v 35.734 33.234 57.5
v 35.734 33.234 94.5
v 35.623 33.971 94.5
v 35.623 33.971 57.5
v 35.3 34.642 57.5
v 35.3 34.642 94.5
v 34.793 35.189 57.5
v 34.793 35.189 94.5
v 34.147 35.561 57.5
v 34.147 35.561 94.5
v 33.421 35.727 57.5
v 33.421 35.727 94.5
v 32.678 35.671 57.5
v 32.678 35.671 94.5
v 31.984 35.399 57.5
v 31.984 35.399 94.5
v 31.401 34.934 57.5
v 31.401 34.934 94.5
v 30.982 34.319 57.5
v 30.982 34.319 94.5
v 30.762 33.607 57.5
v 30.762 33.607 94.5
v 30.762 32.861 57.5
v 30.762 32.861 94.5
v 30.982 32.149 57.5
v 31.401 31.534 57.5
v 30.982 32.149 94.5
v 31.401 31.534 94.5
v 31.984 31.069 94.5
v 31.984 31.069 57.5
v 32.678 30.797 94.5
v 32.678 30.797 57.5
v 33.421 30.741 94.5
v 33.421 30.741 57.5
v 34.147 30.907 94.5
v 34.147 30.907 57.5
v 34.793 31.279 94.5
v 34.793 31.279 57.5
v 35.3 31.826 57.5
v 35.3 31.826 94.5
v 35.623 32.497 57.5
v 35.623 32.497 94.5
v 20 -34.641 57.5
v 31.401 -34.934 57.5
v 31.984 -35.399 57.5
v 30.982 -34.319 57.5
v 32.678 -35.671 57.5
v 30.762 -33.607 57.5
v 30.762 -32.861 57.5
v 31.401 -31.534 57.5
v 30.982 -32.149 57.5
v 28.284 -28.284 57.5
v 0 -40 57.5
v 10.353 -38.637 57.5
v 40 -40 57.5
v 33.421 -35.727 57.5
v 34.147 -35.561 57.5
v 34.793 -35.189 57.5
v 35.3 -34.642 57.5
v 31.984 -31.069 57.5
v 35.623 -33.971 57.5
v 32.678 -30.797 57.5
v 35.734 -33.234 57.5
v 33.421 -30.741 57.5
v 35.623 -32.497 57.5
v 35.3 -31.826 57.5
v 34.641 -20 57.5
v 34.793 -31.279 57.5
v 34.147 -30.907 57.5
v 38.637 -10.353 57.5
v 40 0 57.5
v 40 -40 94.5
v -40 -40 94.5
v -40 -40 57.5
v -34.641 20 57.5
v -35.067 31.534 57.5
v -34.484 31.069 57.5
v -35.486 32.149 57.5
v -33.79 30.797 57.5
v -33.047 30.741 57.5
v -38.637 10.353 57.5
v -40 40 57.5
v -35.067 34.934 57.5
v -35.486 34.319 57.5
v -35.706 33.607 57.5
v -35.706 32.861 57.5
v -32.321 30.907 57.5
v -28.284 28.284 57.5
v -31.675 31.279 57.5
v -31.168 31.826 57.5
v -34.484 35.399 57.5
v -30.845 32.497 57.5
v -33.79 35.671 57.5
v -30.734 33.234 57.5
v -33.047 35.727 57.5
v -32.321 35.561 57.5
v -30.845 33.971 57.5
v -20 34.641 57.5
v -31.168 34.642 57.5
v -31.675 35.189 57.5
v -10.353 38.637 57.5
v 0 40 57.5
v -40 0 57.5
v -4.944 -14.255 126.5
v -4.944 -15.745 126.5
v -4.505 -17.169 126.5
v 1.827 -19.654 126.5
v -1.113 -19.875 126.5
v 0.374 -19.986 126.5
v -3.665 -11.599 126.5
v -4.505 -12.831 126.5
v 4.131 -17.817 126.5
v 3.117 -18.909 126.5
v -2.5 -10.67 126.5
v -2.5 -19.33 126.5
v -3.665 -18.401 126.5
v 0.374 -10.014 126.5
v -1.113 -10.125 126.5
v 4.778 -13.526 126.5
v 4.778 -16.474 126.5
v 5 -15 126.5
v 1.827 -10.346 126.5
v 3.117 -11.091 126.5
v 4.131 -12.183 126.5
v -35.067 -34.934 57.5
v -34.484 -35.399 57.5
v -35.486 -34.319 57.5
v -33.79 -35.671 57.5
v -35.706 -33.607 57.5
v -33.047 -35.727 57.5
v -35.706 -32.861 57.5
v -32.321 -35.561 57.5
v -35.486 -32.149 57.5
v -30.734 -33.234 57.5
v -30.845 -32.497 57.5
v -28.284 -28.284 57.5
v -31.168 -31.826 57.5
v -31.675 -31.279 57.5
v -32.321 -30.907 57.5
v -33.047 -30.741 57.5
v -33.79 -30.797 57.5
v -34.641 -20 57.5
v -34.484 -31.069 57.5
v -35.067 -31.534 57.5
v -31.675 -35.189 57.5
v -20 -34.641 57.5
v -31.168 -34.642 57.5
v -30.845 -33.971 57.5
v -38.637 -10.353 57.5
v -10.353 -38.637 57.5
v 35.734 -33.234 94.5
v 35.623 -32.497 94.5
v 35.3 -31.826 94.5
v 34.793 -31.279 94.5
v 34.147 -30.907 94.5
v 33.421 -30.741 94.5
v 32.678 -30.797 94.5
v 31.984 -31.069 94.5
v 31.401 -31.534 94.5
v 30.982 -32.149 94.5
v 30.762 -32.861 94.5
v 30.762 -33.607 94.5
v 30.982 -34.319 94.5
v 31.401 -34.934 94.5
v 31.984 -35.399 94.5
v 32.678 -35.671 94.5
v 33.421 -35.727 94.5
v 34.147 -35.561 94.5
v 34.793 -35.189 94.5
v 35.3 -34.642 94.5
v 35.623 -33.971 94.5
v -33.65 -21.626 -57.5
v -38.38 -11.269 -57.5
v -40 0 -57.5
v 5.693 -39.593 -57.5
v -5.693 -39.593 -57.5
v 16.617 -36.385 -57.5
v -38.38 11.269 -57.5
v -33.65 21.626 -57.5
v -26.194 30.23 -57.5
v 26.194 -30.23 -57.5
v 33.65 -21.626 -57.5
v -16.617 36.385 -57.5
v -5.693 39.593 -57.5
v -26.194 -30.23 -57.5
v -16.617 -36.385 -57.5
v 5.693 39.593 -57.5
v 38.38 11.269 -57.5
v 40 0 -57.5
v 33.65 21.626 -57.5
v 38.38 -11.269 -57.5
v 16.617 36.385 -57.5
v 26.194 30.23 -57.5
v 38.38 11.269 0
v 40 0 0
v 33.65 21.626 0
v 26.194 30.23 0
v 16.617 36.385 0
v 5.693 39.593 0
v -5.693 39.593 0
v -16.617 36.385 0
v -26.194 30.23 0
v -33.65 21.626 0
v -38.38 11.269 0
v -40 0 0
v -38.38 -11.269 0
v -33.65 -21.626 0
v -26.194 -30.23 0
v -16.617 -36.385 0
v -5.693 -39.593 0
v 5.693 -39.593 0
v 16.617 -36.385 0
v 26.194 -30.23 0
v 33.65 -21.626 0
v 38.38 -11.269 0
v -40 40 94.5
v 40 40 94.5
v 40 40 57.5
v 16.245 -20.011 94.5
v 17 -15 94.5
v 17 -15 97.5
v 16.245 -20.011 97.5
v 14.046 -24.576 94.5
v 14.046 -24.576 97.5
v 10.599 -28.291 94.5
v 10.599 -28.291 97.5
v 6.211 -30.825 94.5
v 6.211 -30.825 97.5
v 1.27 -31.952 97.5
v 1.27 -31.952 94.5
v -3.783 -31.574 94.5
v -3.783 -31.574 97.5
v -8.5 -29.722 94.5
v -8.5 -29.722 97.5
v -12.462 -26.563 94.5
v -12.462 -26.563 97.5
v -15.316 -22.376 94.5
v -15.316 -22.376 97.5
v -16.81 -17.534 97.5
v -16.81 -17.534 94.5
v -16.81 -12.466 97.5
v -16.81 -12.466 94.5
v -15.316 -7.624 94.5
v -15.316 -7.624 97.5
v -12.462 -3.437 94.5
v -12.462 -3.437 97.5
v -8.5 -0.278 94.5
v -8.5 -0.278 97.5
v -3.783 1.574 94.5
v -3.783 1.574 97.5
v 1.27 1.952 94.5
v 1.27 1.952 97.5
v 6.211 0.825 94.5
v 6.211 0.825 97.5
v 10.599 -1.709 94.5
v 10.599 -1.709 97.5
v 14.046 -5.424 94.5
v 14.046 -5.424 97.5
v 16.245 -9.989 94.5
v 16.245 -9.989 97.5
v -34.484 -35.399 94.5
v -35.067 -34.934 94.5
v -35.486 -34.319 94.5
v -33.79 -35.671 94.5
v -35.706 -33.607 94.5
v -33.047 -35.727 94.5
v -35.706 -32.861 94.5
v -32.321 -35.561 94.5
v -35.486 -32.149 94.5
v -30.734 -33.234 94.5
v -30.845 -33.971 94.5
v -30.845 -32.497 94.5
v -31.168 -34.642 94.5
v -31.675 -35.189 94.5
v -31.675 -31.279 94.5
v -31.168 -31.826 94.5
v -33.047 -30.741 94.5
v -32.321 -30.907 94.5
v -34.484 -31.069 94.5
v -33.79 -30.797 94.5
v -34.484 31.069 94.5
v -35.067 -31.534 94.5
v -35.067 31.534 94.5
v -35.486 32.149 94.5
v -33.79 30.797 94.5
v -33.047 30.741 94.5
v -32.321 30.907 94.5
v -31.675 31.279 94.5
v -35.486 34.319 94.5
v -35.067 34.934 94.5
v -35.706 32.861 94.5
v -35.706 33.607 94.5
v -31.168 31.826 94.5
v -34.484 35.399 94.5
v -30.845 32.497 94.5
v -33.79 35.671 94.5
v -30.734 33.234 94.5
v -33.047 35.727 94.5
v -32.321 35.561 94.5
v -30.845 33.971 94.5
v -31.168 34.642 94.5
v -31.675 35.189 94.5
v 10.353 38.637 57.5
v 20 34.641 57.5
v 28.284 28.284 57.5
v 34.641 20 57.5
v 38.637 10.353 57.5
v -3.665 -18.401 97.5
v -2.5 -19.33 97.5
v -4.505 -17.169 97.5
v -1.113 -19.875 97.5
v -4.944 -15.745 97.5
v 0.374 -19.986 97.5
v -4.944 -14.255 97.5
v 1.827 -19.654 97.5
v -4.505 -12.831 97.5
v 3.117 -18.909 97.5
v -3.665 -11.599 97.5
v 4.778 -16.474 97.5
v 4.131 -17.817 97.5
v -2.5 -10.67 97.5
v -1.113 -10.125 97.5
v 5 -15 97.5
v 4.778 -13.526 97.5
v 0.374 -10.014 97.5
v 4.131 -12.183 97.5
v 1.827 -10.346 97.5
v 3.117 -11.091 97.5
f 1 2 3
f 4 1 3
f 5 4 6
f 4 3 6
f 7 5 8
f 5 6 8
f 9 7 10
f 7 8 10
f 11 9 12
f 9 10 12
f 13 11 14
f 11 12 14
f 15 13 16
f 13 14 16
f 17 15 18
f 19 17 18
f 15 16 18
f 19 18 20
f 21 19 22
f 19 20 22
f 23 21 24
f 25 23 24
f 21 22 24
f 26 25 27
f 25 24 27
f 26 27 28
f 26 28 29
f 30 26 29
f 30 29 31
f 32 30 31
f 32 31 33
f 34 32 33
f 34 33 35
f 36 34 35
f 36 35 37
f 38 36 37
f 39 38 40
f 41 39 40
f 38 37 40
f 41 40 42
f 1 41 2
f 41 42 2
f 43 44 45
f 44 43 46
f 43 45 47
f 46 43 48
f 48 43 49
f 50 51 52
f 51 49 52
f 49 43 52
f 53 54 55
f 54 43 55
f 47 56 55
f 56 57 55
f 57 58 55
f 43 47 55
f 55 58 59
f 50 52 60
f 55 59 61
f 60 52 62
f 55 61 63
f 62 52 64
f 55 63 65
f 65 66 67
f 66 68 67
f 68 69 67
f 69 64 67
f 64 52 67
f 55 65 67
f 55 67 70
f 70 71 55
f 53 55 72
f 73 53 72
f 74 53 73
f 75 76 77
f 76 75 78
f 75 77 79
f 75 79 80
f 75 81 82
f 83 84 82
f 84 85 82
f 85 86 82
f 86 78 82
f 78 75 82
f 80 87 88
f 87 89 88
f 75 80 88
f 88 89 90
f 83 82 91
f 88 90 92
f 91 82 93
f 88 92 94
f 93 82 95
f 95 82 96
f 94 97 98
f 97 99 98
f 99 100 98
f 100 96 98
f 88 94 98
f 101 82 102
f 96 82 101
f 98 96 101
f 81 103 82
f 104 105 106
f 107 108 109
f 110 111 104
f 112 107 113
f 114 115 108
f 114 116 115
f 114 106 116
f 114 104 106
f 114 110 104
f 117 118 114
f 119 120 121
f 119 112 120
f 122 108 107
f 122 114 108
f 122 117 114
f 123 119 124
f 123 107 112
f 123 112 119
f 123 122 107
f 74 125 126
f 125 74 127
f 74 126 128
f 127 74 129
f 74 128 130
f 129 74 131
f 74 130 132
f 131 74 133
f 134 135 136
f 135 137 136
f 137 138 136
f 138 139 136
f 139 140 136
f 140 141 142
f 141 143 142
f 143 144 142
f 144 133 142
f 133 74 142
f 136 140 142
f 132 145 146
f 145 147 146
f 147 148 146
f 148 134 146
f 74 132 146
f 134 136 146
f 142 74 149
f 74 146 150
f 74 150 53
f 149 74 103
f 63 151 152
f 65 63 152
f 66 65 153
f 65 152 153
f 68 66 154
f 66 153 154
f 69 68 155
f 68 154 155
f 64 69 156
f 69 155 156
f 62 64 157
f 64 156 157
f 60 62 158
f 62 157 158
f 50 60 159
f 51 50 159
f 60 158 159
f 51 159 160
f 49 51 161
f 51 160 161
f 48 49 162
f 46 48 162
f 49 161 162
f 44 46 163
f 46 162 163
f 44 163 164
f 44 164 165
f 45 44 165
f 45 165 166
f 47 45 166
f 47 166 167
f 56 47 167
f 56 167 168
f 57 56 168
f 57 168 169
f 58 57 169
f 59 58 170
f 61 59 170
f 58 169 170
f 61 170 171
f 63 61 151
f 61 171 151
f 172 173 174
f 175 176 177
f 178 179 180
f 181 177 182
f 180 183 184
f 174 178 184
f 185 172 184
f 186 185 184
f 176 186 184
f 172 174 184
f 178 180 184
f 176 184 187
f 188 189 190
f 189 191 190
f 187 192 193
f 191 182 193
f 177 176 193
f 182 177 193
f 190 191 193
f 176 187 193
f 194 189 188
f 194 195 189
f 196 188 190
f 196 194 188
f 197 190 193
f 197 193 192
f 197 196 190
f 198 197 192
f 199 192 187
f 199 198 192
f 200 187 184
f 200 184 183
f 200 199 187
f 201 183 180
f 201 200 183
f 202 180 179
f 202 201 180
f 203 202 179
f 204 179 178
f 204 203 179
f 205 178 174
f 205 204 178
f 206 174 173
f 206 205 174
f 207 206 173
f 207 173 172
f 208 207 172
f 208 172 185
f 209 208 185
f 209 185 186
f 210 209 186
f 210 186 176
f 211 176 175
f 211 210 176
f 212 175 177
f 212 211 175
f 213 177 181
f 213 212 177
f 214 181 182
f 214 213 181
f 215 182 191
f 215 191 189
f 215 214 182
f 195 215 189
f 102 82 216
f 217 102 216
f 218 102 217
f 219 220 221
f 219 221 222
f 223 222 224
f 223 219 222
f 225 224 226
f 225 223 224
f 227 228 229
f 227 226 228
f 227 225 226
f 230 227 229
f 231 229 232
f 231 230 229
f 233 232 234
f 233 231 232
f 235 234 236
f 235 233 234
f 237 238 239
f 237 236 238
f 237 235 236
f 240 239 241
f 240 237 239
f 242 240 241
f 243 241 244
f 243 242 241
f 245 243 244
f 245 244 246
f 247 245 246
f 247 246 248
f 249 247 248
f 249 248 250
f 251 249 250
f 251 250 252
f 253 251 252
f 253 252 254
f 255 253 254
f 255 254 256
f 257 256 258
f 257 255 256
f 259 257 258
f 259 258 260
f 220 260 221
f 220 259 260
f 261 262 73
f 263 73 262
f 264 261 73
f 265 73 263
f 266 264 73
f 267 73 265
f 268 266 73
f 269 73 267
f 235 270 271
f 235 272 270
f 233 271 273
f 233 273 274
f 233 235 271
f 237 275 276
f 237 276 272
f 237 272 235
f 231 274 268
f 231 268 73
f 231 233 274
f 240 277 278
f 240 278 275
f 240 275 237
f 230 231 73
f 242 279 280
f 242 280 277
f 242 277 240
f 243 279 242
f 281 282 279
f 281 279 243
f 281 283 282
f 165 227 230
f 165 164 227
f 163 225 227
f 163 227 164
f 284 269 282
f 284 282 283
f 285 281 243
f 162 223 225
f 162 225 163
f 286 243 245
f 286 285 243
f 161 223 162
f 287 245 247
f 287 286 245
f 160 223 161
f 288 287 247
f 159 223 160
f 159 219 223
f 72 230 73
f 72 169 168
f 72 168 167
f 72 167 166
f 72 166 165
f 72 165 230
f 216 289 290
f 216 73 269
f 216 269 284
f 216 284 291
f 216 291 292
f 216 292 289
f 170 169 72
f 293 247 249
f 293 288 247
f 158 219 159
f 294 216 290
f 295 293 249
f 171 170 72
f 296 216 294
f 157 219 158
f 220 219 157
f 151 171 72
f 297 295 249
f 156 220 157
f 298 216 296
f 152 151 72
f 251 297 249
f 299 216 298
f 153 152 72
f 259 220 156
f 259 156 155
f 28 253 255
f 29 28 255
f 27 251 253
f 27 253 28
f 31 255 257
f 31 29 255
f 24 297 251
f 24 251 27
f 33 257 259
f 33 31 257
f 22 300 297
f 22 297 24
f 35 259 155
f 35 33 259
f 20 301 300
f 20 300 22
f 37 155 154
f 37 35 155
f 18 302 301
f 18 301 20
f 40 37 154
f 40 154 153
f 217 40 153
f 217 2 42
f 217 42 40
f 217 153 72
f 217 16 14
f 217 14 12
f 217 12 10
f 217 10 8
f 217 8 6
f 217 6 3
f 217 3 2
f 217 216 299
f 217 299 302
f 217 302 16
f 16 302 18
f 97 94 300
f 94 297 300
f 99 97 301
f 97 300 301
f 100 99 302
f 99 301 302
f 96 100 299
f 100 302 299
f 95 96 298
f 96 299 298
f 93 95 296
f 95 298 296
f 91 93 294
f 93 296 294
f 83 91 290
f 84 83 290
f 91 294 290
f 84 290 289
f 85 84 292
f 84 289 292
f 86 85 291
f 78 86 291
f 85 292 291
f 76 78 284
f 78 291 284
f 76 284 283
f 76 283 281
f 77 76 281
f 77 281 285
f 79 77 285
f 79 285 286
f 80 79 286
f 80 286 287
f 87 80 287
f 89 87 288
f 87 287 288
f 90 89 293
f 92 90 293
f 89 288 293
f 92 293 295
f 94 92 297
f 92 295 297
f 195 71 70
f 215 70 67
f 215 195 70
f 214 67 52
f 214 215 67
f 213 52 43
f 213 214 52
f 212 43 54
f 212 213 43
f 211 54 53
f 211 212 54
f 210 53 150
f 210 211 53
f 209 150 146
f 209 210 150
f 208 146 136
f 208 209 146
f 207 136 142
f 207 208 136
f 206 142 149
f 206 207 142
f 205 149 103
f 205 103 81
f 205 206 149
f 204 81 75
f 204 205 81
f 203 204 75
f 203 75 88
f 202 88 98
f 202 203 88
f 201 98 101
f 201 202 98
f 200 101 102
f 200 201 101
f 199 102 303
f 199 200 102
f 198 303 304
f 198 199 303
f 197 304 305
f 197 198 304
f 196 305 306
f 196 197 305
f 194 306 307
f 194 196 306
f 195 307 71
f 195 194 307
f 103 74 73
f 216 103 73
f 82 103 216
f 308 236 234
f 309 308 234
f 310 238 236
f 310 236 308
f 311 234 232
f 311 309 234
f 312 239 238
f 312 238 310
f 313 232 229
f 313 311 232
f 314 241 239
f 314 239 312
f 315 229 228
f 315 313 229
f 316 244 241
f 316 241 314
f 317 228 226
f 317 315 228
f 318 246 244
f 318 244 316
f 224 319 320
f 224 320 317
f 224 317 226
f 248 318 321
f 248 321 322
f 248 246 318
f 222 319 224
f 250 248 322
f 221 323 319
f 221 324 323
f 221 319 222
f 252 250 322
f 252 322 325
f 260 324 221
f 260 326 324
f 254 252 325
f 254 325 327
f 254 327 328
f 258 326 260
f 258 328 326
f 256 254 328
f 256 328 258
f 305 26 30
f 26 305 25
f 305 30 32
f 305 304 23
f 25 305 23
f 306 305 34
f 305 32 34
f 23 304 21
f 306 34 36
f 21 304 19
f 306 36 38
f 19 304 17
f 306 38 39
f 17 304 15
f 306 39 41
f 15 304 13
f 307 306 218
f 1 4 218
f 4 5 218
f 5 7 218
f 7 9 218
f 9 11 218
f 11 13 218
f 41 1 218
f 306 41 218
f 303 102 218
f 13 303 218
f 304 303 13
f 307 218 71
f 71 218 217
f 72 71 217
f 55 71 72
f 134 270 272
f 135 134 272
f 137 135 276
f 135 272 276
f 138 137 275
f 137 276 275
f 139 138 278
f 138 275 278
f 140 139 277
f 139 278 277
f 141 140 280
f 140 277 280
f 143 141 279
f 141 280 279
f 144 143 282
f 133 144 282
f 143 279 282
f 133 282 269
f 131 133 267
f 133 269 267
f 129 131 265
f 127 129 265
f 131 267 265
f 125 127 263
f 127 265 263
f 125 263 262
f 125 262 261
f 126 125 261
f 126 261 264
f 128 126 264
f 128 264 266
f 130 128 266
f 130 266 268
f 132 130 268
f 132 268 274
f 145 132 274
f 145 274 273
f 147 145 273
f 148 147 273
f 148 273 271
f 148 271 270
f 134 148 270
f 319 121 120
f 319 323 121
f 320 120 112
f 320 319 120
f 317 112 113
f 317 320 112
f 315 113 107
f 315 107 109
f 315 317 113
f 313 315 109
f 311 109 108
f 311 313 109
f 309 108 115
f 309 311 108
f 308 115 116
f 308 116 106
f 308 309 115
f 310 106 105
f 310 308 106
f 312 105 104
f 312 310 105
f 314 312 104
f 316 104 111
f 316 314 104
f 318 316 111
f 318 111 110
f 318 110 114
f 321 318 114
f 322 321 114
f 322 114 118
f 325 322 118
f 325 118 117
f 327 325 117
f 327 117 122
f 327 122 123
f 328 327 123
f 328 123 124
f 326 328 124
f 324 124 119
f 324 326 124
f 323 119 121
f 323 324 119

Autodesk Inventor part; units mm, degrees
ref_plane "YZ Plane" through (0, 0, 0) normal (1, 0, 0) x (0, 1, 0)
ref_plane "XZ Plane" through (0, 0, 0) normal (0, 1, 0) x (-1, 0, 0)
ref_plane "XY Plane" through (0, 0, 0) normal (0, 0, 1) x (1, 0, 0)
sketch "Sketch1" plane through (0, 0, 0) normal (0, 0, 1) x (1, 0, 0)
  circle A0 centre (0, 0) radius 40
  dimension "d0" = 80
extrude "Extrusion1" add sketch "Sketch1" along normal mid plane 115
sketch "Sketch3" plane through (0, 0, 57.5) normal (0, 0, 1) x (1, 0, 0)
  line L0 (-40, 40) -> (40, 40)
  line L1 (40, 40) -> (40, -40)
  line L2 (40, -40) -> (-40, -40)
  line L3 (-40, -40) -> (-40, 40)
  line L4 (-40, 40) -> (40, -40) construction
  line L5 (40, 40) -> (-40, -40) construction
  point P0 (0, 0)
  dimension "d9" = 80
  dimension "d10" = 80
extrude "Extrusion3" add sketch "Sketch3" along normal blind 37
sketch "Sketch4" plane through (0, 0, 94.5) normal (0, 0, 1) x (1, 0, 0)
  line L0 (0, 0) -> (0, -15)
  circle A0 centre (0, -15) radius 5
  dimension "d11" = 15
  dimension "d12" = 10
extrude "Extrusion4" add sketch "Sketch4" along normal blind 32
sketch "Sketch5" plane through (0, 0, 94.5) normal (0, 0, 1) x (1, 0, 0)
  circle A0 centre (0, -15) radius 17
  point P0 (0, 0)
  dimension "d15" = 34
extrude "Extrusion5" add sketch "Sketch5" along normal blind 3
sketch "Sketch6" plane through (0, 0, 94.5) normal (0, 0, 1) x (1, 0, 0)
  circle A0 centre (0, 0) radius 47
  line L0 (40, 0) -> (40, 40) projected
  line L1 (-40, 0) -> (-40, -40) projected
  line L2 (40, 40) -> (-40, -40)
  line L3 (-40, -40) -> (-40, 40)
  line L4 (40, -40) -> (40, 40) projected
  line L5 (-40, 40) -> (40, -40)
  circle A1 centre (33.234, 33.234) radius 2.5
  circle A2 centre (-33.234, 33.234) radius 2.5
  circle A3 centre (-33.234, -33.234) radius 2.5
  circle A4 centre (33.234, -33.234) radius 2.5
  dimension "d18" = 94
  dimension "d19" = 5
  dimension "d22" = 360
extrude "Extrusion6" cut sketch "Sketch6" against normal blind 40 contours A1 L2 A0 | A0 L2 A1 | A4 L5 A0 | A0 L5 A4 | L2 A1 A0 | A0 A1 L2 | L5 A4 A0 | A0 A4 L5 | A2 L5 A0 | A0 L5 A2 | A3 A0 L2 | L2 A0 A3 | A2 A0 L5 | A3 L2 A0 | A0 A2 L5 | L2 A3 A0
properties part number "MOTOR DC"
